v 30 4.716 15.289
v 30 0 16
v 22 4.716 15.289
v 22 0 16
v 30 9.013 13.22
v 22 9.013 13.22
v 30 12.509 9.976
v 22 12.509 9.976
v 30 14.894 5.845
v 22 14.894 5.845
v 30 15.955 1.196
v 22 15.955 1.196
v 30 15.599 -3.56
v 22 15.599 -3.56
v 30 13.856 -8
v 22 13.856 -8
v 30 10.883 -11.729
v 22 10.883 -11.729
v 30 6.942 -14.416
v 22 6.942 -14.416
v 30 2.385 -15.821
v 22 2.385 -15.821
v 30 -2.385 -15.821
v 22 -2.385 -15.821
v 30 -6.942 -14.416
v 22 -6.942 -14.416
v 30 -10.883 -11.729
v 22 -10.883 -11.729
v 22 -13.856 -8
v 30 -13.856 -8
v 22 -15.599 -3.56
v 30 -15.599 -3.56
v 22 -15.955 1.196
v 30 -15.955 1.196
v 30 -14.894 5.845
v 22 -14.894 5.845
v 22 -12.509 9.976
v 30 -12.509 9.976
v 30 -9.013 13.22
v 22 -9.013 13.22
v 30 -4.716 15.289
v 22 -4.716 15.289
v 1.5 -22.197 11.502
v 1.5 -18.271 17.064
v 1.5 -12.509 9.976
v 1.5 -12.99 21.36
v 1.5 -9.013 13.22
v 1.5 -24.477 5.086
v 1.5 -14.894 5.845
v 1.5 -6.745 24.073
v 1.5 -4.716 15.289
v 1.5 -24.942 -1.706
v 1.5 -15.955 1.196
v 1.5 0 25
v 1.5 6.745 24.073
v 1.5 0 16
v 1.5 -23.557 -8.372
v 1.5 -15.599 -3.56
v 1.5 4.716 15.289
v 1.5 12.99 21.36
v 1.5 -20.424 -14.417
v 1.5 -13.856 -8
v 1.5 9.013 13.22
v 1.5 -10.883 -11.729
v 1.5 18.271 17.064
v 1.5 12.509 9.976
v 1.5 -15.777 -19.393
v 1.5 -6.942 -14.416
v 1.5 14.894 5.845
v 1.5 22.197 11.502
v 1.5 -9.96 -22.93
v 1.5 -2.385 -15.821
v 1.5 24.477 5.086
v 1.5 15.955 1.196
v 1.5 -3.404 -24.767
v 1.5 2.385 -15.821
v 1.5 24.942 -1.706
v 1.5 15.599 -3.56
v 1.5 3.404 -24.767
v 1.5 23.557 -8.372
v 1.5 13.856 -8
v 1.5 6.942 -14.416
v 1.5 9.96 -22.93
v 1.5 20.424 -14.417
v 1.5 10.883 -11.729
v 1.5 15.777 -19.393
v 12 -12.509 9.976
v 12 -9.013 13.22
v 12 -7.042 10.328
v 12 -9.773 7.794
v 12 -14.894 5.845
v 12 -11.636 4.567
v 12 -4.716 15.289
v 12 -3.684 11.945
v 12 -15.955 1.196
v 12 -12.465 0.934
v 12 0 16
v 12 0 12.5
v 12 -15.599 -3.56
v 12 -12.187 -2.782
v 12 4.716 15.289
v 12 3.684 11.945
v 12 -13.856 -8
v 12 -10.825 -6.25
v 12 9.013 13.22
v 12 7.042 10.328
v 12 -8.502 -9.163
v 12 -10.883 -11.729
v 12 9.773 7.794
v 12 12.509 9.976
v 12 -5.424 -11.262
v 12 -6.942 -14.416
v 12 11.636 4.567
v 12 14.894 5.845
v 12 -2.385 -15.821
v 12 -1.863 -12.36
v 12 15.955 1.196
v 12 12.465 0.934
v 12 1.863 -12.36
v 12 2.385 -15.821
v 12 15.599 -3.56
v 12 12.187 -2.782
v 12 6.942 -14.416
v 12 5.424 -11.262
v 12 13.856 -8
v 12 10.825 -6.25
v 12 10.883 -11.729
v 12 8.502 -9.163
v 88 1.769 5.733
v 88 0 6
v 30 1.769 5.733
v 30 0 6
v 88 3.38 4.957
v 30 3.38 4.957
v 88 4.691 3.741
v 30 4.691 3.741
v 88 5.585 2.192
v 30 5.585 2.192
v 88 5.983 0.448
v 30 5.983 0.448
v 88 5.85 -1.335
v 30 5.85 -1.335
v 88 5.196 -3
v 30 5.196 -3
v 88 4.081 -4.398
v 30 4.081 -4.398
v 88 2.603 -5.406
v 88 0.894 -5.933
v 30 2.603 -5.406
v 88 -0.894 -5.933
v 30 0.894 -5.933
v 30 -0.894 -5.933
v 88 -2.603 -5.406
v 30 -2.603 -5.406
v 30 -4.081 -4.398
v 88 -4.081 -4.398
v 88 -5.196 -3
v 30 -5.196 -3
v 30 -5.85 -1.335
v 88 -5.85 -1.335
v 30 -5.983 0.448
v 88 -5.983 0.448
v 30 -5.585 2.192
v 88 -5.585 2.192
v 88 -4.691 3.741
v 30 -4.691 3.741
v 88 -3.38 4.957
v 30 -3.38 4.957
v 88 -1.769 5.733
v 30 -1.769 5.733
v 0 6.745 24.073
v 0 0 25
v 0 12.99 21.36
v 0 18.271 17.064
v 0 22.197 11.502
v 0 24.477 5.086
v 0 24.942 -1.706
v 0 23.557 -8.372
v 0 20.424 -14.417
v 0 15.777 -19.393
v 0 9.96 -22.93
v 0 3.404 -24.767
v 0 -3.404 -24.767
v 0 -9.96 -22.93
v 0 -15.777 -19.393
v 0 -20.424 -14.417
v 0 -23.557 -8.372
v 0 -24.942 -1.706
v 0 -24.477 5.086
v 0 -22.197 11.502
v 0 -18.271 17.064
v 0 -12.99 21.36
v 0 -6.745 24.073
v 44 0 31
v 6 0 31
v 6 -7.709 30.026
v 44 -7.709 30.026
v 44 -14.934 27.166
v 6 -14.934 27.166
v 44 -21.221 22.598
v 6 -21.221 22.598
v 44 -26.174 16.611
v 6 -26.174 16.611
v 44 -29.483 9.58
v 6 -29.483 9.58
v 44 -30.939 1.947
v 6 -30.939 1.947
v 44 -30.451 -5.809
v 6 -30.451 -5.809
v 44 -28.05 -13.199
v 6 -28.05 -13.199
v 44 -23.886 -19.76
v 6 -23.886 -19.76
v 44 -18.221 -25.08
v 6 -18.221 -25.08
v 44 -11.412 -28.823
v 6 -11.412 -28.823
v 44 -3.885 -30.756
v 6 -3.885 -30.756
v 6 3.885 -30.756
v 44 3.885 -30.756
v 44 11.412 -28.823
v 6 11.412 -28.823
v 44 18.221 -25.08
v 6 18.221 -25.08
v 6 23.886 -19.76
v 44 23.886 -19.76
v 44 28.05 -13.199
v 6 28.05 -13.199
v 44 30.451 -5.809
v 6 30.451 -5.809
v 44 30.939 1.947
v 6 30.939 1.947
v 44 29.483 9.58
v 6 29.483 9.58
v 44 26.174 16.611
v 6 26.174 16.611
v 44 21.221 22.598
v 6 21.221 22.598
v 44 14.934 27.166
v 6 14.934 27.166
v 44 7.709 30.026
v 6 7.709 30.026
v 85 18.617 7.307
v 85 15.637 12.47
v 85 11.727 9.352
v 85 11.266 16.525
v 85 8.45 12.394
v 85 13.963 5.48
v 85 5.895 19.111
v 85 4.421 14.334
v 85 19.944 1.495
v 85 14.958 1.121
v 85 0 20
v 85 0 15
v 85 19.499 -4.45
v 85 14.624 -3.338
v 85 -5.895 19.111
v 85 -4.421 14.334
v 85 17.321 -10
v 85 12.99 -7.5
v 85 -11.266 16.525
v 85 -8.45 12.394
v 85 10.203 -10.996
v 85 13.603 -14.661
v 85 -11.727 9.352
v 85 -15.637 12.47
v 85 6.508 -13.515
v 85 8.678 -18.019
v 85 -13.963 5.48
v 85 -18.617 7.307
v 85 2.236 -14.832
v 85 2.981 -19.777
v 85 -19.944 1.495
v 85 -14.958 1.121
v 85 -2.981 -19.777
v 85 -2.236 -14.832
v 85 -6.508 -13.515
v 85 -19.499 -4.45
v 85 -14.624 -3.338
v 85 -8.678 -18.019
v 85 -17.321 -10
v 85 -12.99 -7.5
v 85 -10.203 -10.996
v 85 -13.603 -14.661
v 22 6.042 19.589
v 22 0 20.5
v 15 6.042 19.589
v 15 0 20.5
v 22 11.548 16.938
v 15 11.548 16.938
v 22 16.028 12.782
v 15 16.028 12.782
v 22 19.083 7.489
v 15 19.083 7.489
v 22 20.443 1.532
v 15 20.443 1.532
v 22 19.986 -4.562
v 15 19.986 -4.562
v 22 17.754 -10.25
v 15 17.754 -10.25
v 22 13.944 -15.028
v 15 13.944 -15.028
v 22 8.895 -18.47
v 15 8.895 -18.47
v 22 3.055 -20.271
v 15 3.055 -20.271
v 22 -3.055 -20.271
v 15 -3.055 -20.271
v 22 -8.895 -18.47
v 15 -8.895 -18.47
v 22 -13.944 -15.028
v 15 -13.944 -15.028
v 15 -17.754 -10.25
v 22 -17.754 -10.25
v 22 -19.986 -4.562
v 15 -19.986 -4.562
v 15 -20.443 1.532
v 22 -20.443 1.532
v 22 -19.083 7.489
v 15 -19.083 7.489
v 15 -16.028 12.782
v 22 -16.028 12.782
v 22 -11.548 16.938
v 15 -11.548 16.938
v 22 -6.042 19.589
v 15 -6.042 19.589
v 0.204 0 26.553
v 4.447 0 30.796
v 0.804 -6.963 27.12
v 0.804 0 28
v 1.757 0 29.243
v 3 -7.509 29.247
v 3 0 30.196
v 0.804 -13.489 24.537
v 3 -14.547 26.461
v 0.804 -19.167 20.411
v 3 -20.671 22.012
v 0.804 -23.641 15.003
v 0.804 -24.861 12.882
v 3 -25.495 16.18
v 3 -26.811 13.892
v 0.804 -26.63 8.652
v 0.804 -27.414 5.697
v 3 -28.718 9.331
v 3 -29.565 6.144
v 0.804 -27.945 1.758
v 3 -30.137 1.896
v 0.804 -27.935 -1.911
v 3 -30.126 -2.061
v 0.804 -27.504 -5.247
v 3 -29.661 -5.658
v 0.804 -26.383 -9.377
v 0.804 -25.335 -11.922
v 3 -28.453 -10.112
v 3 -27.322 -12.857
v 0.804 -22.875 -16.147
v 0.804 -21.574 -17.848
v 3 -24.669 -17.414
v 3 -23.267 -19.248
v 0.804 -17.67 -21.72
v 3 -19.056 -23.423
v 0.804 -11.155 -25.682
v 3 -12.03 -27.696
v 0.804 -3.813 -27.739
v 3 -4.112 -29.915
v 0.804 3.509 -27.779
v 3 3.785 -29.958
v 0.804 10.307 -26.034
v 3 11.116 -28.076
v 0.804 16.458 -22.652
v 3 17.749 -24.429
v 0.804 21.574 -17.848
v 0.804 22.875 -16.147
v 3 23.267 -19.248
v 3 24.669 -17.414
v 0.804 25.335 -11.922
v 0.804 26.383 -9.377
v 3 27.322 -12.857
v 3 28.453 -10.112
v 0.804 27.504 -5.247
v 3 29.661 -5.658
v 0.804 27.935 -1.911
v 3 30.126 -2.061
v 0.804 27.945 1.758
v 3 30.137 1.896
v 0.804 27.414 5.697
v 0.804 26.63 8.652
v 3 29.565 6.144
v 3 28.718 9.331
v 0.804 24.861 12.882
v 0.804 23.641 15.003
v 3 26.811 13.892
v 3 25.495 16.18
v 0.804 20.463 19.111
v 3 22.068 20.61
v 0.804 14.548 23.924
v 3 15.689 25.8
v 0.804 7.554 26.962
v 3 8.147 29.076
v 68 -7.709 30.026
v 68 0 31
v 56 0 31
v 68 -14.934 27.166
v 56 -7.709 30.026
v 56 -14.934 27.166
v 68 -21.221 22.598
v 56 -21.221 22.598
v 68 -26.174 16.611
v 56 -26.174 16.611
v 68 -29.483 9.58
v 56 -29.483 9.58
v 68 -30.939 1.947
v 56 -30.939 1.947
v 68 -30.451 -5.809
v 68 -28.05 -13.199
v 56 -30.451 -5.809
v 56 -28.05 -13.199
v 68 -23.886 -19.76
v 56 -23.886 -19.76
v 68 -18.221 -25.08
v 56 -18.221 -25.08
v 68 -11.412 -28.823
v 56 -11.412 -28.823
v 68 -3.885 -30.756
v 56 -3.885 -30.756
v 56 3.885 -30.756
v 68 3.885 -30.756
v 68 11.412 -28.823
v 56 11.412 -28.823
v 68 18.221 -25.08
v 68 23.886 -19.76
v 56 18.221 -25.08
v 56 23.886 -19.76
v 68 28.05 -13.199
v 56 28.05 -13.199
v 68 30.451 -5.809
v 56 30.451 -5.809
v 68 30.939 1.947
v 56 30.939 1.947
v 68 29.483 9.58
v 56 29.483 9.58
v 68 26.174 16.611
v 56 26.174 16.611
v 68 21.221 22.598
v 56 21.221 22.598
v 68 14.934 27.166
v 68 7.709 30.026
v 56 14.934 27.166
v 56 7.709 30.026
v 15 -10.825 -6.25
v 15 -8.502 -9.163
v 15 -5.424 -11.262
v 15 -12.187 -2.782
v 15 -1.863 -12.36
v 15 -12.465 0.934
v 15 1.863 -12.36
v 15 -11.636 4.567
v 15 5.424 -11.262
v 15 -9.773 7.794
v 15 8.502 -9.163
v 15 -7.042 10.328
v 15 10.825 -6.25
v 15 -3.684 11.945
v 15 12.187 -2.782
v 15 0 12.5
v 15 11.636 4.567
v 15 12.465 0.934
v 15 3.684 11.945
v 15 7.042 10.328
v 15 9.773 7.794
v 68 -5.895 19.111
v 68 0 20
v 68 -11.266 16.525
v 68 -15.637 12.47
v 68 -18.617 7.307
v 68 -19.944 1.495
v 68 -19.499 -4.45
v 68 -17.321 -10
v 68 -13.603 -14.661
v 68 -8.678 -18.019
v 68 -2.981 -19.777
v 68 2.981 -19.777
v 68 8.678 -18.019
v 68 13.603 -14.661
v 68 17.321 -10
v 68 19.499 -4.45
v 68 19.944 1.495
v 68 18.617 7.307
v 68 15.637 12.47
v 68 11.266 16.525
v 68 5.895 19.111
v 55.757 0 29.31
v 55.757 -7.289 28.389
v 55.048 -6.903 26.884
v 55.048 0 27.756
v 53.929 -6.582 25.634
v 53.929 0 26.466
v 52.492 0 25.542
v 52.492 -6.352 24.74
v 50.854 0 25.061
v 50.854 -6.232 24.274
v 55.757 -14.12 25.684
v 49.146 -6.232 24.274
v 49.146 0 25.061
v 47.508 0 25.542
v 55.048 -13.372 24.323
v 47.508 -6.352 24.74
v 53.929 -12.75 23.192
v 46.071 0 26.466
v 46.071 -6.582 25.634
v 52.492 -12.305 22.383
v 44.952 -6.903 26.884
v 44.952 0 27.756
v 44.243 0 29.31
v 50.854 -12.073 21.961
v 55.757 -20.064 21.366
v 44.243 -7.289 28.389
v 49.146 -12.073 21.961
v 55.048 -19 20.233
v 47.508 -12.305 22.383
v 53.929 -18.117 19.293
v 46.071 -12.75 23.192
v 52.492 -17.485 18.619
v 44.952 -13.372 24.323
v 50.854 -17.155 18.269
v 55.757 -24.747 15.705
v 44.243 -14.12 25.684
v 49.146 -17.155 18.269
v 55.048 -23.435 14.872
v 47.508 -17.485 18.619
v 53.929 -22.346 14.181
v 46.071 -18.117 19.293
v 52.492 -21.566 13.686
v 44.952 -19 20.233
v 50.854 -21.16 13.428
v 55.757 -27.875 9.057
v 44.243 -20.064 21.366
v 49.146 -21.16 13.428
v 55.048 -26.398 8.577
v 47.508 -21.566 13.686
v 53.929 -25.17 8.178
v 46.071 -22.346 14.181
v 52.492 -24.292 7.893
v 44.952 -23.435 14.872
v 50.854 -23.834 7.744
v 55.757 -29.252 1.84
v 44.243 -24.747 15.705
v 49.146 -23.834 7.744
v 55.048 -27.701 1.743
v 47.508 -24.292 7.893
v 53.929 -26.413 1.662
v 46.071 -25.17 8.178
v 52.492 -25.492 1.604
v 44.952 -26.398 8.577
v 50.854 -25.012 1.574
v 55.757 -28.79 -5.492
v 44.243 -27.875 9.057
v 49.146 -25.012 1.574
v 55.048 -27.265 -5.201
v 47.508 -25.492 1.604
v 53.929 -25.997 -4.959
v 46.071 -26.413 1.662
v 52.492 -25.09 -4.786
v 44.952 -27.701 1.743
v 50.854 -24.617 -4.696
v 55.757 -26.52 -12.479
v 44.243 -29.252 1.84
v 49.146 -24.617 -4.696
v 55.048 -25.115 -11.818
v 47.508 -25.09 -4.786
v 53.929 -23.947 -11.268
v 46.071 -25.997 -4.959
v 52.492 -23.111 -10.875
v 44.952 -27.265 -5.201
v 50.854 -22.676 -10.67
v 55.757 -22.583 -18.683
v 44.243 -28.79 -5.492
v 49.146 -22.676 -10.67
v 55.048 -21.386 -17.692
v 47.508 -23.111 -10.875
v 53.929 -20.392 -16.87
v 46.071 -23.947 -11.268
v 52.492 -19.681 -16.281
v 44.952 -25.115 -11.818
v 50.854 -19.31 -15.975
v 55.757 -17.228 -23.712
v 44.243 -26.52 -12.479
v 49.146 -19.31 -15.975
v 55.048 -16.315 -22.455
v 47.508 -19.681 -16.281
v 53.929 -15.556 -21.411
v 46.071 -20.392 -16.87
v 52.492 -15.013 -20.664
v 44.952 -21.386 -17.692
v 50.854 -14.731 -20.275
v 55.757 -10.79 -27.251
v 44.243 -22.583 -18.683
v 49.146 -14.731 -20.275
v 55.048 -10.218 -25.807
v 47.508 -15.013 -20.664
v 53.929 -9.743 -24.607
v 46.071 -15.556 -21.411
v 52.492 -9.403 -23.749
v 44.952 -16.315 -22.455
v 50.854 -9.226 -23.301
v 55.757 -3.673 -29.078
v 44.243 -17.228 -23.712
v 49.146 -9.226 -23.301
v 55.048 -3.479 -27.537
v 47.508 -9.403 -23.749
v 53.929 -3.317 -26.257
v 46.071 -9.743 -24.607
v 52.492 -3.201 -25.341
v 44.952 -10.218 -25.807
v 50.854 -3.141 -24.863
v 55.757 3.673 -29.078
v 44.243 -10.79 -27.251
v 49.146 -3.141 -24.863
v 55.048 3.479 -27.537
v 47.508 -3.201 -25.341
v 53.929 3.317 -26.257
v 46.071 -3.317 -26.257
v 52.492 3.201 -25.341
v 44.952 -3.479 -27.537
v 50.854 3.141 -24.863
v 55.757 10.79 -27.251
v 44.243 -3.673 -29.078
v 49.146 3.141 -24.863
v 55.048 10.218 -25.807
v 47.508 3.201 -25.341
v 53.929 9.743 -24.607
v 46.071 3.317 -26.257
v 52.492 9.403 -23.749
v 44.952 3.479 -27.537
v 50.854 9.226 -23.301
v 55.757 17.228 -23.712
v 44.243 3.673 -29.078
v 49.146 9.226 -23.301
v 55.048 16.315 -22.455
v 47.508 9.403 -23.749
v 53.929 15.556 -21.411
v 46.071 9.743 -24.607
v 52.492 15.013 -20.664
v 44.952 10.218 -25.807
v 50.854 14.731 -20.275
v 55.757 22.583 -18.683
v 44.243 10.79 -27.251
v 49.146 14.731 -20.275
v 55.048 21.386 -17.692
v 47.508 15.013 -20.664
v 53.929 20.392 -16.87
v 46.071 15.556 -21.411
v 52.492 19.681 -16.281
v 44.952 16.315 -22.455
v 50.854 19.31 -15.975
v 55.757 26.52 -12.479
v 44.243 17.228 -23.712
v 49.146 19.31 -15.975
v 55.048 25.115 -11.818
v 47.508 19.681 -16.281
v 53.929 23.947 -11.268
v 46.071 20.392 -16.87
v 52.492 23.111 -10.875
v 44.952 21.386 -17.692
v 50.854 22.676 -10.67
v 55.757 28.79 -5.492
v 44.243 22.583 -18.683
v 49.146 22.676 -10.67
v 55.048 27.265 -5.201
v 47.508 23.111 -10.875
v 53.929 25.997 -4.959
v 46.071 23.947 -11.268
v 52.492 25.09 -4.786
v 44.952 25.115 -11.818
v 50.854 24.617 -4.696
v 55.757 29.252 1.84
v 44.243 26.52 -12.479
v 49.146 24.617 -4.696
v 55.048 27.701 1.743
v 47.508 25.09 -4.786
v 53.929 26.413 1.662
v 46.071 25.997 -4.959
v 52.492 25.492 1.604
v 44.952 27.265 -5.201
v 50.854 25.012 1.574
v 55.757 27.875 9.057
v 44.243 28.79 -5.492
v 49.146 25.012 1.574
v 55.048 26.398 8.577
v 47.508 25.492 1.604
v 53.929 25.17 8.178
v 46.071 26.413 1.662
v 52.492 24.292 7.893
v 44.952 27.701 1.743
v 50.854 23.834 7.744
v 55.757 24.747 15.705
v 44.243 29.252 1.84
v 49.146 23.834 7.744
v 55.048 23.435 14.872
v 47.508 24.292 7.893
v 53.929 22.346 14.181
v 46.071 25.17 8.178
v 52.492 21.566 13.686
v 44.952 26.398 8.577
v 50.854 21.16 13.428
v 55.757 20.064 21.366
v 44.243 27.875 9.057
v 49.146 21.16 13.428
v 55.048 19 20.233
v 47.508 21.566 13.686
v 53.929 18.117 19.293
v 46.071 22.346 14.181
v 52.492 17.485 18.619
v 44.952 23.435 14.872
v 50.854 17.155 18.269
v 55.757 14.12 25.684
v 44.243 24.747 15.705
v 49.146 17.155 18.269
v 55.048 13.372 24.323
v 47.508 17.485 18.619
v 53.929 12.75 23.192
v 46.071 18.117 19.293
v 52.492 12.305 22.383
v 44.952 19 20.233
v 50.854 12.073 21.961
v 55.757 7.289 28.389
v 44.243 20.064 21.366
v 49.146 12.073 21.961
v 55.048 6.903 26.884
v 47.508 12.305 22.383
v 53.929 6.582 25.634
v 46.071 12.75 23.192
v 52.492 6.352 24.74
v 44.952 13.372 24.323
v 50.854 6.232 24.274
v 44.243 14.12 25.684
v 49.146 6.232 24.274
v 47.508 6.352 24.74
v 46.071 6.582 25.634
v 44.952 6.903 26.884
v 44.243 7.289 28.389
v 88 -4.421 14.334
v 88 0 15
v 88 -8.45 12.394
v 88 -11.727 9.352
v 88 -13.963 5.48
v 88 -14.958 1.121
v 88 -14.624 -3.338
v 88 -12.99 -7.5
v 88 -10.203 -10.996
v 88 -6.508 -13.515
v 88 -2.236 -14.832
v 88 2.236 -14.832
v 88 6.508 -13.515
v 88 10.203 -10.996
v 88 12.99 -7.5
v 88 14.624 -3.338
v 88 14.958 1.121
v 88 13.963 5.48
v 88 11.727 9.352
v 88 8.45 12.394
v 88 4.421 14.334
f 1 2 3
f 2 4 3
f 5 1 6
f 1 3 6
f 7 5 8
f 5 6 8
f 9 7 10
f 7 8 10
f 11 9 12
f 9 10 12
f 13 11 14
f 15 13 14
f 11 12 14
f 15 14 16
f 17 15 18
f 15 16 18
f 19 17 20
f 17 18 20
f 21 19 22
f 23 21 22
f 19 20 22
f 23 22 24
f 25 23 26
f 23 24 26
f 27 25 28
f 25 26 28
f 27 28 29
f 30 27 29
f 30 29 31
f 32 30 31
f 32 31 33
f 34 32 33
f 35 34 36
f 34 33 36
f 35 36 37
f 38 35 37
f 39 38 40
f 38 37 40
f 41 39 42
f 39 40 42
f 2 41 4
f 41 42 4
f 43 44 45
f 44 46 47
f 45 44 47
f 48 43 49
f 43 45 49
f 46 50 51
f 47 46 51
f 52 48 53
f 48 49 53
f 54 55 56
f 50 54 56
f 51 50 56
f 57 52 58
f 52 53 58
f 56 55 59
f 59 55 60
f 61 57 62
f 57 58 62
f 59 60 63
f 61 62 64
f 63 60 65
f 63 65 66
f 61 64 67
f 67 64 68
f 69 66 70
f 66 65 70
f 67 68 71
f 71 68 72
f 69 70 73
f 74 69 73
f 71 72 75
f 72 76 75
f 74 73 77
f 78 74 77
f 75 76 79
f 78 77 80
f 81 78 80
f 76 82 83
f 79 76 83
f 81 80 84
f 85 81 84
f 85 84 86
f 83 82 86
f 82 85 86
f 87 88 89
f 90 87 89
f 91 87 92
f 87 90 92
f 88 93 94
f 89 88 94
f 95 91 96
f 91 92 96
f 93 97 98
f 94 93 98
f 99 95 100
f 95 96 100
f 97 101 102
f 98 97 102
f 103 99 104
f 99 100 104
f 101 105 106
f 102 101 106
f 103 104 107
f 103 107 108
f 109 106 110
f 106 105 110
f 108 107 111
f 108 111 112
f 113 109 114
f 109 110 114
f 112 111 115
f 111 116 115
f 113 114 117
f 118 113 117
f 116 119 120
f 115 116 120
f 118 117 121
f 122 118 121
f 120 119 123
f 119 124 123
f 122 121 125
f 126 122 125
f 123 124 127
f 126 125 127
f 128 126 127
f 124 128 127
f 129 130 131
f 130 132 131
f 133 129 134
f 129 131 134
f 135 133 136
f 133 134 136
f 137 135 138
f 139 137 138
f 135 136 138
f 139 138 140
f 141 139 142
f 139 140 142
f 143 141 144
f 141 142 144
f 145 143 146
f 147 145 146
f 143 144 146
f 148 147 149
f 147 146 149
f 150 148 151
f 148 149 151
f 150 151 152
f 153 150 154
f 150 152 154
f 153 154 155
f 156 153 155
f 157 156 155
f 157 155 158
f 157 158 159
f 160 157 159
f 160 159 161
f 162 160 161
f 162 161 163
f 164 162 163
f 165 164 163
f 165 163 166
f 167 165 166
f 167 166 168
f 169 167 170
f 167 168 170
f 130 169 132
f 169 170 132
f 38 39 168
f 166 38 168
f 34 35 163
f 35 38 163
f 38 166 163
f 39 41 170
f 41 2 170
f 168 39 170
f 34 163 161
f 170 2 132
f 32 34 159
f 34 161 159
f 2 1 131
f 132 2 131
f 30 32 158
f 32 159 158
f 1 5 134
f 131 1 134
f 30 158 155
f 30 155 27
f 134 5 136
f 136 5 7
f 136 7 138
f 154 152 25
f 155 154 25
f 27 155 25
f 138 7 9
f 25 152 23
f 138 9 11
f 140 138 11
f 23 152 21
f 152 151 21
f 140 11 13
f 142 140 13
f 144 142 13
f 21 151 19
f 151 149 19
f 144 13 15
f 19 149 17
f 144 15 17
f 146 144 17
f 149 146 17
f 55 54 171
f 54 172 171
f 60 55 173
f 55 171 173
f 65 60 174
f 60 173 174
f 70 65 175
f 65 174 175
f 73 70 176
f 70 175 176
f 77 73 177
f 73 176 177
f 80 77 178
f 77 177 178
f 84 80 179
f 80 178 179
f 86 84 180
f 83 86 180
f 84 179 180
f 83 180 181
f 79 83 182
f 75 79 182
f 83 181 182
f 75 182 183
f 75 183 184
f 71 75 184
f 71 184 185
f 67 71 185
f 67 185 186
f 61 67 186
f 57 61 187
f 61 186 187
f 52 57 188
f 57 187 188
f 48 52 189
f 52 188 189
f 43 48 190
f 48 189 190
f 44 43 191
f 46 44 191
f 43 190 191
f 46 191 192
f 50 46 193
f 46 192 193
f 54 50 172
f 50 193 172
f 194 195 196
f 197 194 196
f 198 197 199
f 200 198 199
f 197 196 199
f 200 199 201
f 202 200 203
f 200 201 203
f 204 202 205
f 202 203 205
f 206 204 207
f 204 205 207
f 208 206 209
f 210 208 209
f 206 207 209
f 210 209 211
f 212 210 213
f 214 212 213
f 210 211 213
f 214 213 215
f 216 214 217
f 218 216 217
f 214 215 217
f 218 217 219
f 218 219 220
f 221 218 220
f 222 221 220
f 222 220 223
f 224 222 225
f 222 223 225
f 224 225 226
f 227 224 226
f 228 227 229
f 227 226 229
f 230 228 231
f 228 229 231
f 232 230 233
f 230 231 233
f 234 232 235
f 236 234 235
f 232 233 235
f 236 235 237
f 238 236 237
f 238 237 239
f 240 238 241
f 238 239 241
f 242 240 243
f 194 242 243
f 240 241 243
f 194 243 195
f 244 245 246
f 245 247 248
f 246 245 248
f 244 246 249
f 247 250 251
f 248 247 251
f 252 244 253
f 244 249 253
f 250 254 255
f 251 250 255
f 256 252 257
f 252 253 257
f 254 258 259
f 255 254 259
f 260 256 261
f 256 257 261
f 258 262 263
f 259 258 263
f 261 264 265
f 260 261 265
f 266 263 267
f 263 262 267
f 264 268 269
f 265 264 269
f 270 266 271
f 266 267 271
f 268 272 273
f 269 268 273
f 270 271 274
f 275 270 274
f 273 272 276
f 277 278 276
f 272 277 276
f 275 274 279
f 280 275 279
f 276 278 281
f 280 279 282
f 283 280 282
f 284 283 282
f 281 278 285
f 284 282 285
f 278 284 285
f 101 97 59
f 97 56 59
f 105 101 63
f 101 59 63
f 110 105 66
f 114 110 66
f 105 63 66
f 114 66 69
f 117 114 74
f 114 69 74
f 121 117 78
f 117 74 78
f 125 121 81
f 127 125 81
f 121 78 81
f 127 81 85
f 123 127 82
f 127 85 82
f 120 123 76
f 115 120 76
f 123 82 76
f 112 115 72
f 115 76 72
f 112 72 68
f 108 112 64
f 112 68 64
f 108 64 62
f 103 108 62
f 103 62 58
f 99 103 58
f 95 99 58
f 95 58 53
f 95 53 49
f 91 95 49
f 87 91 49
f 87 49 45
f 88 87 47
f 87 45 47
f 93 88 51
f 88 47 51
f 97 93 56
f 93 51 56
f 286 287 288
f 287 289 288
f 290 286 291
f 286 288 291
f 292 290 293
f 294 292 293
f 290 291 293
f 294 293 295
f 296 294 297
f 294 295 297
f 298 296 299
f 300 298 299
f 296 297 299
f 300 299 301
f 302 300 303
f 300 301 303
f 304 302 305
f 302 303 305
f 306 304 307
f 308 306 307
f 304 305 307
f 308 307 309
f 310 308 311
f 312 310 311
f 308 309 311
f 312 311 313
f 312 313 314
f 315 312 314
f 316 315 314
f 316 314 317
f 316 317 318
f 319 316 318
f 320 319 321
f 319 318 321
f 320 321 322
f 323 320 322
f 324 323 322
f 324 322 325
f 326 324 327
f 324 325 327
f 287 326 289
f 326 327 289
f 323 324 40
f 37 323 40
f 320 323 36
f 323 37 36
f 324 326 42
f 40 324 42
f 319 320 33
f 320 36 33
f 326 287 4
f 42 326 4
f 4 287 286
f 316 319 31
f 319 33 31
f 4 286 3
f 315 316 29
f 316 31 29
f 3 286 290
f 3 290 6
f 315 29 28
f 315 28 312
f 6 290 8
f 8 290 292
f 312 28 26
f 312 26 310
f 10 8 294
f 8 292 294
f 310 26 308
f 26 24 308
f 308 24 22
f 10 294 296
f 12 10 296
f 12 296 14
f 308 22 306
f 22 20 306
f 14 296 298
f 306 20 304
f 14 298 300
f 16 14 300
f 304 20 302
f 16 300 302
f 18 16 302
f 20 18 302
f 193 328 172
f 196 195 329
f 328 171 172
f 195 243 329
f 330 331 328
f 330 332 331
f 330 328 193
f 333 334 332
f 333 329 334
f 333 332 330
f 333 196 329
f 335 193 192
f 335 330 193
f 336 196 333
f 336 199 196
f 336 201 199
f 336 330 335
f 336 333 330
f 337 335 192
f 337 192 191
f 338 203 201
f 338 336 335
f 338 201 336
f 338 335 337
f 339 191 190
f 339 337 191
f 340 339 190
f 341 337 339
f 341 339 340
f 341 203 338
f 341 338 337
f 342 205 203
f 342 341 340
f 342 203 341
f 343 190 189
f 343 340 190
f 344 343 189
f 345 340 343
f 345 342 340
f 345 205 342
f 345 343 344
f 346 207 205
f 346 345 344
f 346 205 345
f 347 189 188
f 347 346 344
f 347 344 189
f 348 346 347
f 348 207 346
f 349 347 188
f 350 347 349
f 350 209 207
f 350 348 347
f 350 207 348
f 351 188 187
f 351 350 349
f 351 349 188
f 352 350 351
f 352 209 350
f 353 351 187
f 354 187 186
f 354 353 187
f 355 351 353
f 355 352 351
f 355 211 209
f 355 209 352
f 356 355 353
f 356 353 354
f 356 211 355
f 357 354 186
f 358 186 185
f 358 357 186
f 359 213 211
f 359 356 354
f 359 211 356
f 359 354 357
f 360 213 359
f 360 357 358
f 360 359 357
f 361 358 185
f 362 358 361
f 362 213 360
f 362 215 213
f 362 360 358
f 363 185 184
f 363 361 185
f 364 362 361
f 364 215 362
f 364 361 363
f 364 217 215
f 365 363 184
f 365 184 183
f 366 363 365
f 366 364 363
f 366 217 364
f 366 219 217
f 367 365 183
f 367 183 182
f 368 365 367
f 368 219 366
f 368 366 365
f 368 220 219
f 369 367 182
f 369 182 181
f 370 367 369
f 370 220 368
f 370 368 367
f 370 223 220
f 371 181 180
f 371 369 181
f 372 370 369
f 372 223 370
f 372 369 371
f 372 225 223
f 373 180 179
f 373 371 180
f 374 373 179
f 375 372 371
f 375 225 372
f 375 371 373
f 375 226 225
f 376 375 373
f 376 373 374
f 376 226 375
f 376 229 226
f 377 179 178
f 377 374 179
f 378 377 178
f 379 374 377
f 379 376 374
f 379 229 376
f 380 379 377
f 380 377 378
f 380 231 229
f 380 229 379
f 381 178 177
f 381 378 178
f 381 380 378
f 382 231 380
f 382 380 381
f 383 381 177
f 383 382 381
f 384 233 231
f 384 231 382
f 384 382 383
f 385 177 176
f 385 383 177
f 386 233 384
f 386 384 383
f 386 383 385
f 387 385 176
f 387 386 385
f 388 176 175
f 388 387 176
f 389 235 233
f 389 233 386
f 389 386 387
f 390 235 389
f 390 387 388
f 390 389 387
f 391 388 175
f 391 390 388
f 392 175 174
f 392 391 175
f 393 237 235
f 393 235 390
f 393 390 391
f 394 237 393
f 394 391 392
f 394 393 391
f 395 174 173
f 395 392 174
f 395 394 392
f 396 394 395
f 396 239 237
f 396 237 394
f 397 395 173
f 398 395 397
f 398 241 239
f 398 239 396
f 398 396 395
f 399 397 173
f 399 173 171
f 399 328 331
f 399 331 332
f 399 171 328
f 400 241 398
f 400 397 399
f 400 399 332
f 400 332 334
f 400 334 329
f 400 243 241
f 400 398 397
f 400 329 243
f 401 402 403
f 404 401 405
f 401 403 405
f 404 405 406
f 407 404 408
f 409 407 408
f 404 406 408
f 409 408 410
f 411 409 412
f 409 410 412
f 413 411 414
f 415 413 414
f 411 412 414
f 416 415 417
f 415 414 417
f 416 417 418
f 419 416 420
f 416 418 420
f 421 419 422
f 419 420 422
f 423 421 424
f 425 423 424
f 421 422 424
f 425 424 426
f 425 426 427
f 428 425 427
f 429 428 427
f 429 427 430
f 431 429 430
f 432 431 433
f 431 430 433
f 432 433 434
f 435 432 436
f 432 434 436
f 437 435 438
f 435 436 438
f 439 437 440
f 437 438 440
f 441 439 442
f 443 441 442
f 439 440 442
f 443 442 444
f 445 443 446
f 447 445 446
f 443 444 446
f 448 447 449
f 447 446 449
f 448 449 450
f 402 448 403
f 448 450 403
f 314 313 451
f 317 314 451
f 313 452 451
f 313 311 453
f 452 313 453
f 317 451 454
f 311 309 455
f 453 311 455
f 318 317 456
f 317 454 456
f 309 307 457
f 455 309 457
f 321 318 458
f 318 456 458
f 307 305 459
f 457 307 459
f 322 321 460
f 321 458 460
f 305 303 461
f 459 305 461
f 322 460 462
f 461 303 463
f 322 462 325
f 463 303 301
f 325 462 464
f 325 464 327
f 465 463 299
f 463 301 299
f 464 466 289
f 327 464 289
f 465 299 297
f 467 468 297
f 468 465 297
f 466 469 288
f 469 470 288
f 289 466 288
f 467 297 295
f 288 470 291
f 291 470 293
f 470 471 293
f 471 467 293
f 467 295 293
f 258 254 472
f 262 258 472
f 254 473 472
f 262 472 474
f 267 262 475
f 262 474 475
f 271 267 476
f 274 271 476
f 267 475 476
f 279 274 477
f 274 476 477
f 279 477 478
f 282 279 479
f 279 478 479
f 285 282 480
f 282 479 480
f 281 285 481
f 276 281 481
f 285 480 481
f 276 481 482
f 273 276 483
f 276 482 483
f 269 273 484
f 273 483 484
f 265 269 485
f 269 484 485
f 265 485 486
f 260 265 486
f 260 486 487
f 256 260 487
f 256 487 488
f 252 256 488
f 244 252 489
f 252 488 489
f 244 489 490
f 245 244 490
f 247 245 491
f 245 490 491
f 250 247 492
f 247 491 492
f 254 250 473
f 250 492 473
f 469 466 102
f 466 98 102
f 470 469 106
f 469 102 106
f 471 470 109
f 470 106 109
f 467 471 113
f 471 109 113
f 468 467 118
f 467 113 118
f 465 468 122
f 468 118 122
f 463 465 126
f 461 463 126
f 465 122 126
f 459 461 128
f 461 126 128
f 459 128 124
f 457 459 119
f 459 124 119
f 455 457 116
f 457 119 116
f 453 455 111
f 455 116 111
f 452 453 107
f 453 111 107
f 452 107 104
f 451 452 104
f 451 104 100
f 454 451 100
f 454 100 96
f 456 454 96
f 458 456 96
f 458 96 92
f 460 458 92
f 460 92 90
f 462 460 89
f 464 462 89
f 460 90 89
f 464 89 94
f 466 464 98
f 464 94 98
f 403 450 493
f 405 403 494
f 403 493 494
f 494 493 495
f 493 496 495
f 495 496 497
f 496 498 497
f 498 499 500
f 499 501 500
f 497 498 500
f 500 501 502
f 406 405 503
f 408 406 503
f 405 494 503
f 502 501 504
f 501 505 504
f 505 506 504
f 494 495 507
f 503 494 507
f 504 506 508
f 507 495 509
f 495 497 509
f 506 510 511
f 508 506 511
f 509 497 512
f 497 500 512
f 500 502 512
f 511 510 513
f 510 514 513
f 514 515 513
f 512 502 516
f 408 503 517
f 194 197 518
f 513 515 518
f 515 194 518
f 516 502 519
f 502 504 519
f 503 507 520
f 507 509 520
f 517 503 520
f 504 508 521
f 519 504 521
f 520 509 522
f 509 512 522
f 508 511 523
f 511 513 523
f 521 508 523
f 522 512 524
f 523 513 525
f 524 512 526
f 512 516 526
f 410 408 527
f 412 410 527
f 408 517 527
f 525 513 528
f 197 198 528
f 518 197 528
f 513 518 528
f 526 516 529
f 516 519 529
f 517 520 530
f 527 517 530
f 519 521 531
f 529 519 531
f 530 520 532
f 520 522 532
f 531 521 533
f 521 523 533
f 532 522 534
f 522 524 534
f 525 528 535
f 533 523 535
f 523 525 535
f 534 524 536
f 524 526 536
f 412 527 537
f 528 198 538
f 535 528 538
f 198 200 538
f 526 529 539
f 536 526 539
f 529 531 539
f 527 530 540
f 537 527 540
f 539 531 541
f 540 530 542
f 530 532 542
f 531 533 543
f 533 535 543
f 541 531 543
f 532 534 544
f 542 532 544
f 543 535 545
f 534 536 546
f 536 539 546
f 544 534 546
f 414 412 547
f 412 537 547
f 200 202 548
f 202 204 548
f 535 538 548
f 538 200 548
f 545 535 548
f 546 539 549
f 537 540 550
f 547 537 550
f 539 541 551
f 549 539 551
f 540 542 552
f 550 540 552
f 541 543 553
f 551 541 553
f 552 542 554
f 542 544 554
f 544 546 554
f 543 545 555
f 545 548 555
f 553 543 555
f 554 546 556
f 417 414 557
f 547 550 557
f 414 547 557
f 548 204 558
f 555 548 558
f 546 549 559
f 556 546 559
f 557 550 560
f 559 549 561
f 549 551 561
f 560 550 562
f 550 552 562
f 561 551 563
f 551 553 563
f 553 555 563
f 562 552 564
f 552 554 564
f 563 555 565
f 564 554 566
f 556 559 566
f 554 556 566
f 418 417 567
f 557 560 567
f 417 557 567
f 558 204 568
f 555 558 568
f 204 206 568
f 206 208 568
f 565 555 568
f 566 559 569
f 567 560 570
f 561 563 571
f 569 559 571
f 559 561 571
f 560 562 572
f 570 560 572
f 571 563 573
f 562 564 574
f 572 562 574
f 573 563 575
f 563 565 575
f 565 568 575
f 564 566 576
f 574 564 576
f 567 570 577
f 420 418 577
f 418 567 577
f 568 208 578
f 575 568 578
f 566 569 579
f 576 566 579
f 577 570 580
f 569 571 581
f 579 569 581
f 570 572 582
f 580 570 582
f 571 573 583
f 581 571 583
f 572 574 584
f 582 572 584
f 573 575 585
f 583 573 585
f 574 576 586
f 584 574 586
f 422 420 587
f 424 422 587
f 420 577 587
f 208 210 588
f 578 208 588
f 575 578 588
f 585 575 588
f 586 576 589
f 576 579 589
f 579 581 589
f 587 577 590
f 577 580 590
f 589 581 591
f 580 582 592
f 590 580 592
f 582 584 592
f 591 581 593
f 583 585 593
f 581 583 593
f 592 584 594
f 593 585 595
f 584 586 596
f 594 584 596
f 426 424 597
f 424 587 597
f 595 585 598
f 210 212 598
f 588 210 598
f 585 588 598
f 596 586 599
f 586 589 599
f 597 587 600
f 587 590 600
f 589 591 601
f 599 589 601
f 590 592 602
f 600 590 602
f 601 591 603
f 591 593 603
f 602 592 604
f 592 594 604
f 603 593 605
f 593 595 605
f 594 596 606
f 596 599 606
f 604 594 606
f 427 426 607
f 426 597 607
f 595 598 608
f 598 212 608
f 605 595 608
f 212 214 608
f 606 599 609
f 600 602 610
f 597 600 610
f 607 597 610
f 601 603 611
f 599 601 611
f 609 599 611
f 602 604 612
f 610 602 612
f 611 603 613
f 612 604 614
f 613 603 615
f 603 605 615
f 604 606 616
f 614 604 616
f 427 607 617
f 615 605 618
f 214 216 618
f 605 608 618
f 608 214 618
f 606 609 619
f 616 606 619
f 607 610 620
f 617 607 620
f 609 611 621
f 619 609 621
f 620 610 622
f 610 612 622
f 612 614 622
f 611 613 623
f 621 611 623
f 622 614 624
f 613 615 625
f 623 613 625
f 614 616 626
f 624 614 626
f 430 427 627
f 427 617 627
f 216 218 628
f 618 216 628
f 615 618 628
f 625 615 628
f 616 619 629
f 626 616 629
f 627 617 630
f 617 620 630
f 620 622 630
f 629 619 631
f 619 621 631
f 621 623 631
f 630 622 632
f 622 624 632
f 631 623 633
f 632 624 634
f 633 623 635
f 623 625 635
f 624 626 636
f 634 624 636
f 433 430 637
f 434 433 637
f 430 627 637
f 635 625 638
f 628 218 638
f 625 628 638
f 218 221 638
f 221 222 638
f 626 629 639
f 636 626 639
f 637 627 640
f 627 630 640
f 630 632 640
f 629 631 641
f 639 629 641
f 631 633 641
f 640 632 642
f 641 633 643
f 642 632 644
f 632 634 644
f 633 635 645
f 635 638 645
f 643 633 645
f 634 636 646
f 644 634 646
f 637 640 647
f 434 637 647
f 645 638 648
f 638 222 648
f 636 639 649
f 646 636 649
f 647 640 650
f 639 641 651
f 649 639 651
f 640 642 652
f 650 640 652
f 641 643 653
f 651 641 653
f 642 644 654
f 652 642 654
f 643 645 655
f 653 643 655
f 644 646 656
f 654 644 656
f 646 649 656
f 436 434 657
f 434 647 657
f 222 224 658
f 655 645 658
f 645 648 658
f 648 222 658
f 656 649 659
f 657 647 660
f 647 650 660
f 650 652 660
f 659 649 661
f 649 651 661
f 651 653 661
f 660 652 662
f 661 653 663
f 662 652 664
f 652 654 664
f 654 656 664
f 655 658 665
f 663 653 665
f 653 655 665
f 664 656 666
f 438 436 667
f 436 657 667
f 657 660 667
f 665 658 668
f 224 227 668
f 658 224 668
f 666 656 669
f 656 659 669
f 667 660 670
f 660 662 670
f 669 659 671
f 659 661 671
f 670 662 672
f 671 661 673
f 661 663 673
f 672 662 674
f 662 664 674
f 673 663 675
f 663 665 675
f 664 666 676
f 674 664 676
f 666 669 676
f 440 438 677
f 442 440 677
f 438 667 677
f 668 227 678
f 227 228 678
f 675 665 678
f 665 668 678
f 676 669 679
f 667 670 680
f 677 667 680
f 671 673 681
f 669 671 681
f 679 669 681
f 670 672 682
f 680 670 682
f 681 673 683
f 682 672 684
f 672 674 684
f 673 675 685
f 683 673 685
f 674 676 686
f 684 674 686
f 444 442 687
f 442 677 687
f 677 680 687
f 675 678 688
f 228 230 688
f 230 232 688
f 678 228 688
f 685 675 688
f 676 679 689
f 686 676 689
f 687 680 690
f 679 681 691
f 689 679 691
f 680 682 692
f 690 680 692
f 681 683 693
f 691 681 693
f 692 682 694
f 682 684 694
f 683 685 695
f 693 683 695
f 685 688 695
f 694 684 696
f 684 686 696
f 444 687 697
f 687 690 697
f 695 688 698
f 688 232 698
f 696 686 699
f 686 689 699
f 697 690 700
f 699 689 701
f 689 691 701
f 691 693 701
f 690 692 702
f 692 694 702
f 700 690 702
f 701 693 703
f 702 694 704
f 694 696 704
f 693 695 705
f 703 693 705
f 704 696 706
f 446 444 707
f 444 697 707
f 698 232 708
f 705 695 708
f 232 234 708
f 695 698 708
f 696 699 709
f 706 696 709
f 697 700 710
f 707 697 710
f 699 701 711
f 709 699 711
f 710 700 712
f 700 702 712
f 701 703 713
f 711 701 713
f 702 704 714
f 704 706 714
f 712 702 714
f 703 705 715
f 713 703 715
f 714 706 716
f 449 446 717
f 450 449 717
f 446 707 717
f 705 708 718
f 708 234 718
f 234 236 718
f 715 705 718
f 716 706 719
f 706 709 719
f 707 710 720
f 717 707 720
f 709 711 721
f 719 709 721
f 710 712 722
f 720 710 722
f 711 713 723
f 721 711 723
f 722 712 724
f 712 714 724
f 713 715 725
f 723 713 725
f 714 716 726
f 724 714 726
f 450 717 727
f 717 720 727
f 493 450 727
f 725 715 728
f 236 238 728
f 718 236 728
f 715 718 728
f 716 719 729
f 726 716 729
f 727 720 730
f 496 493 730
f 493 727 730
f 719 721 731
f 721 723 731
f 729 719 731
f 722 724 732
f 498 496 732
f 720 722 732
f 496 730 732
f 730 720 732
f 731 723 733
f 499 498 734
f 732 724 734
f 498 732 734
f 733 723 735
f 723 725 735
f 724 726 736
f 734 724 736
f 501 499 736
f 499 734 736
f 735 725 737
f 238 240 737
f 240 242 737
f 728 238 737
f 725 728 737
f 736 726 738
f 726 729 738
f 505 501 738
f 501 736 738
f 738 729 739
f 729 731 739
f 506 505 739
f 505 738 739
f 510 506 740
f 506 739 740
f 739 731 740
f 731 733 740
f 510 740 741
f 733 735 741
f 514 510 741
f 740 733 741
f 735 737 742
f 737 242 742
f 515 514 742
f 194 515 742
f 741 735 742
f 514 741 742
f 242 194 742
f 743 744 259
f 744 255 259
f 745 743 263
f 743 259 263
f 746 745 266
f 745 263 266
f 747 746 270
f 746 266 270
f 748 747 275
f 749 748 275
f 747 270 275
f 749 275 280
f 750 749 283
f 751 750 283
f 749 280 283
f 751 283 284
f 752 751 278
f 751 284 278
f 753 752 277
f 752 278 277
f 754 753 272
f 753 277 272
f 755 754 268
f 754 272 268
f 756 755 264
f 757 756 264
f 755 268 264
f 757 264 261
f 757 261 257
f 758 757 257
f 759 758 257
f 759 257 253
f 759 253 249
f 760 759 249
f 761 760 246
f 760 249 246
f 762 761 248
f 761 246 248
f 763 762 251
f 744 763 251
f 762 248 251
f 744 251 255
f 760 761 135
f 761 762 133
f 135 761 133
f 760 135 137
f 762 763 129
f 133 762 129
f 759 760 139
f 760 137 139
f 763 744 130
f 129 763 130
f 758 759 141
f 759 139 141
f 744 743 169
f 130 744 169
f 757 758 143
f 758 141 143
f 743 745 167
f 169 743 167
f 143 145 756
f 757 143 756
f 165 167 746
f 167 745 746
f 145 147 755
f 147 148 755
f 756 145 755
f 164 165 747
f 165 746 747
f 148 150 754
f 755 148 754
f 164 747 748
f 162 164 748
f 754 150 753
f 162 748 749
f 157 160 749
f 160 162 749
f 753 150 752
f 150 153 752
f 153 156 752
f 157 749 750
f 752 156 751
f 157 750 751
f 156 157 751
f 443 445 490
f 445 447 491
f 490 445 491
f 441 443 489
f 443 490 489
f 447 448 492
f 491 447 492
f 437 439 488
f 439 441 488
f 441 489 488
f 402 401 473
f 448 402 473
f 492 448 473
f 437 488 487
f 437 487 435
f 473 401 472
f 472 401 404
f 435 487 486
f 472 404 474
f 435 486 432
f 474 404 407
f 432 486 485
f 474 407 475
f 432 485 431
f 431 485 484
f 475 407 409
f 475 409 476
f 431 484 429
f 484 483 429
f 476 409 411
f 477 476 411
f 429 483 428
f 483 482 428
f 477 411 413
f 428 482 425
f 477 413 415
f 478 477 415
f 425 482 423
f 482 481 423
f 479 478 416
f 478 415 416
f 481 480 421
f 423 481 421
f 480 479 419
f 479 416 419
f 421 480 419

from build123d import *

# Parameters (mm, degrees)
F4_R = 5.99999


# Not quite as in the source:
# - a fillet or chamfer is up to 0.001 mm smaller than in the source, because OpenCascade refuses the exact size


with BuildPart() as f1:
    # F0 (on Front) → F1 (revolve)
    with BuildSketch(Plane.XZ):
        with BuildLine():
            Line((0, 31), (0, 0))
            Line((0, 0), (88, 0))
            Line((88, 0), (88, 15))
            Line((88, 15), (85, 15))
            Line((85, 15), (85, 20))
            Line((85, 20), (68, 20))
            Line((68, 20), (68, 31))
            Line((68, 31), (56, 31))
            ThreePointArc((56, 31), (50, 25), (44, 31))
            Line((44, 31), (0, 31))
        make_face()
    revolve(axis=Axis((48.1394192929, 0, 0), (1, 0, 0)))

    # F2 (on Front) → F3 (revolve, cut)
    with BuildSketch(Plane.XZ):
        Polygon((0, 25), (0, 0), (88, 0), (88, 6), (30, 6), (30, 16), (22, 16), (22, 20.5), (15, 20.5), (15, 12.5), (12, 12.5), (12, 16), (1.5, 16), (1.5, 25), align=None)
    revolve(axis=Axis((-13.0126860076, 0, 0), (-1, 0, 0)), mode=Mode.SUBTRACT)

    # F4 (radius 6 in the source; OpenCascade refuses exactly that, so slightly less here)
    f4_edges = [f1.edges().sort_by_distance(p)[0] for p in [
        (0, 0, -31),
    ]]
    fillet(f4_edges, radius=F4_R)


solid = f1.part
